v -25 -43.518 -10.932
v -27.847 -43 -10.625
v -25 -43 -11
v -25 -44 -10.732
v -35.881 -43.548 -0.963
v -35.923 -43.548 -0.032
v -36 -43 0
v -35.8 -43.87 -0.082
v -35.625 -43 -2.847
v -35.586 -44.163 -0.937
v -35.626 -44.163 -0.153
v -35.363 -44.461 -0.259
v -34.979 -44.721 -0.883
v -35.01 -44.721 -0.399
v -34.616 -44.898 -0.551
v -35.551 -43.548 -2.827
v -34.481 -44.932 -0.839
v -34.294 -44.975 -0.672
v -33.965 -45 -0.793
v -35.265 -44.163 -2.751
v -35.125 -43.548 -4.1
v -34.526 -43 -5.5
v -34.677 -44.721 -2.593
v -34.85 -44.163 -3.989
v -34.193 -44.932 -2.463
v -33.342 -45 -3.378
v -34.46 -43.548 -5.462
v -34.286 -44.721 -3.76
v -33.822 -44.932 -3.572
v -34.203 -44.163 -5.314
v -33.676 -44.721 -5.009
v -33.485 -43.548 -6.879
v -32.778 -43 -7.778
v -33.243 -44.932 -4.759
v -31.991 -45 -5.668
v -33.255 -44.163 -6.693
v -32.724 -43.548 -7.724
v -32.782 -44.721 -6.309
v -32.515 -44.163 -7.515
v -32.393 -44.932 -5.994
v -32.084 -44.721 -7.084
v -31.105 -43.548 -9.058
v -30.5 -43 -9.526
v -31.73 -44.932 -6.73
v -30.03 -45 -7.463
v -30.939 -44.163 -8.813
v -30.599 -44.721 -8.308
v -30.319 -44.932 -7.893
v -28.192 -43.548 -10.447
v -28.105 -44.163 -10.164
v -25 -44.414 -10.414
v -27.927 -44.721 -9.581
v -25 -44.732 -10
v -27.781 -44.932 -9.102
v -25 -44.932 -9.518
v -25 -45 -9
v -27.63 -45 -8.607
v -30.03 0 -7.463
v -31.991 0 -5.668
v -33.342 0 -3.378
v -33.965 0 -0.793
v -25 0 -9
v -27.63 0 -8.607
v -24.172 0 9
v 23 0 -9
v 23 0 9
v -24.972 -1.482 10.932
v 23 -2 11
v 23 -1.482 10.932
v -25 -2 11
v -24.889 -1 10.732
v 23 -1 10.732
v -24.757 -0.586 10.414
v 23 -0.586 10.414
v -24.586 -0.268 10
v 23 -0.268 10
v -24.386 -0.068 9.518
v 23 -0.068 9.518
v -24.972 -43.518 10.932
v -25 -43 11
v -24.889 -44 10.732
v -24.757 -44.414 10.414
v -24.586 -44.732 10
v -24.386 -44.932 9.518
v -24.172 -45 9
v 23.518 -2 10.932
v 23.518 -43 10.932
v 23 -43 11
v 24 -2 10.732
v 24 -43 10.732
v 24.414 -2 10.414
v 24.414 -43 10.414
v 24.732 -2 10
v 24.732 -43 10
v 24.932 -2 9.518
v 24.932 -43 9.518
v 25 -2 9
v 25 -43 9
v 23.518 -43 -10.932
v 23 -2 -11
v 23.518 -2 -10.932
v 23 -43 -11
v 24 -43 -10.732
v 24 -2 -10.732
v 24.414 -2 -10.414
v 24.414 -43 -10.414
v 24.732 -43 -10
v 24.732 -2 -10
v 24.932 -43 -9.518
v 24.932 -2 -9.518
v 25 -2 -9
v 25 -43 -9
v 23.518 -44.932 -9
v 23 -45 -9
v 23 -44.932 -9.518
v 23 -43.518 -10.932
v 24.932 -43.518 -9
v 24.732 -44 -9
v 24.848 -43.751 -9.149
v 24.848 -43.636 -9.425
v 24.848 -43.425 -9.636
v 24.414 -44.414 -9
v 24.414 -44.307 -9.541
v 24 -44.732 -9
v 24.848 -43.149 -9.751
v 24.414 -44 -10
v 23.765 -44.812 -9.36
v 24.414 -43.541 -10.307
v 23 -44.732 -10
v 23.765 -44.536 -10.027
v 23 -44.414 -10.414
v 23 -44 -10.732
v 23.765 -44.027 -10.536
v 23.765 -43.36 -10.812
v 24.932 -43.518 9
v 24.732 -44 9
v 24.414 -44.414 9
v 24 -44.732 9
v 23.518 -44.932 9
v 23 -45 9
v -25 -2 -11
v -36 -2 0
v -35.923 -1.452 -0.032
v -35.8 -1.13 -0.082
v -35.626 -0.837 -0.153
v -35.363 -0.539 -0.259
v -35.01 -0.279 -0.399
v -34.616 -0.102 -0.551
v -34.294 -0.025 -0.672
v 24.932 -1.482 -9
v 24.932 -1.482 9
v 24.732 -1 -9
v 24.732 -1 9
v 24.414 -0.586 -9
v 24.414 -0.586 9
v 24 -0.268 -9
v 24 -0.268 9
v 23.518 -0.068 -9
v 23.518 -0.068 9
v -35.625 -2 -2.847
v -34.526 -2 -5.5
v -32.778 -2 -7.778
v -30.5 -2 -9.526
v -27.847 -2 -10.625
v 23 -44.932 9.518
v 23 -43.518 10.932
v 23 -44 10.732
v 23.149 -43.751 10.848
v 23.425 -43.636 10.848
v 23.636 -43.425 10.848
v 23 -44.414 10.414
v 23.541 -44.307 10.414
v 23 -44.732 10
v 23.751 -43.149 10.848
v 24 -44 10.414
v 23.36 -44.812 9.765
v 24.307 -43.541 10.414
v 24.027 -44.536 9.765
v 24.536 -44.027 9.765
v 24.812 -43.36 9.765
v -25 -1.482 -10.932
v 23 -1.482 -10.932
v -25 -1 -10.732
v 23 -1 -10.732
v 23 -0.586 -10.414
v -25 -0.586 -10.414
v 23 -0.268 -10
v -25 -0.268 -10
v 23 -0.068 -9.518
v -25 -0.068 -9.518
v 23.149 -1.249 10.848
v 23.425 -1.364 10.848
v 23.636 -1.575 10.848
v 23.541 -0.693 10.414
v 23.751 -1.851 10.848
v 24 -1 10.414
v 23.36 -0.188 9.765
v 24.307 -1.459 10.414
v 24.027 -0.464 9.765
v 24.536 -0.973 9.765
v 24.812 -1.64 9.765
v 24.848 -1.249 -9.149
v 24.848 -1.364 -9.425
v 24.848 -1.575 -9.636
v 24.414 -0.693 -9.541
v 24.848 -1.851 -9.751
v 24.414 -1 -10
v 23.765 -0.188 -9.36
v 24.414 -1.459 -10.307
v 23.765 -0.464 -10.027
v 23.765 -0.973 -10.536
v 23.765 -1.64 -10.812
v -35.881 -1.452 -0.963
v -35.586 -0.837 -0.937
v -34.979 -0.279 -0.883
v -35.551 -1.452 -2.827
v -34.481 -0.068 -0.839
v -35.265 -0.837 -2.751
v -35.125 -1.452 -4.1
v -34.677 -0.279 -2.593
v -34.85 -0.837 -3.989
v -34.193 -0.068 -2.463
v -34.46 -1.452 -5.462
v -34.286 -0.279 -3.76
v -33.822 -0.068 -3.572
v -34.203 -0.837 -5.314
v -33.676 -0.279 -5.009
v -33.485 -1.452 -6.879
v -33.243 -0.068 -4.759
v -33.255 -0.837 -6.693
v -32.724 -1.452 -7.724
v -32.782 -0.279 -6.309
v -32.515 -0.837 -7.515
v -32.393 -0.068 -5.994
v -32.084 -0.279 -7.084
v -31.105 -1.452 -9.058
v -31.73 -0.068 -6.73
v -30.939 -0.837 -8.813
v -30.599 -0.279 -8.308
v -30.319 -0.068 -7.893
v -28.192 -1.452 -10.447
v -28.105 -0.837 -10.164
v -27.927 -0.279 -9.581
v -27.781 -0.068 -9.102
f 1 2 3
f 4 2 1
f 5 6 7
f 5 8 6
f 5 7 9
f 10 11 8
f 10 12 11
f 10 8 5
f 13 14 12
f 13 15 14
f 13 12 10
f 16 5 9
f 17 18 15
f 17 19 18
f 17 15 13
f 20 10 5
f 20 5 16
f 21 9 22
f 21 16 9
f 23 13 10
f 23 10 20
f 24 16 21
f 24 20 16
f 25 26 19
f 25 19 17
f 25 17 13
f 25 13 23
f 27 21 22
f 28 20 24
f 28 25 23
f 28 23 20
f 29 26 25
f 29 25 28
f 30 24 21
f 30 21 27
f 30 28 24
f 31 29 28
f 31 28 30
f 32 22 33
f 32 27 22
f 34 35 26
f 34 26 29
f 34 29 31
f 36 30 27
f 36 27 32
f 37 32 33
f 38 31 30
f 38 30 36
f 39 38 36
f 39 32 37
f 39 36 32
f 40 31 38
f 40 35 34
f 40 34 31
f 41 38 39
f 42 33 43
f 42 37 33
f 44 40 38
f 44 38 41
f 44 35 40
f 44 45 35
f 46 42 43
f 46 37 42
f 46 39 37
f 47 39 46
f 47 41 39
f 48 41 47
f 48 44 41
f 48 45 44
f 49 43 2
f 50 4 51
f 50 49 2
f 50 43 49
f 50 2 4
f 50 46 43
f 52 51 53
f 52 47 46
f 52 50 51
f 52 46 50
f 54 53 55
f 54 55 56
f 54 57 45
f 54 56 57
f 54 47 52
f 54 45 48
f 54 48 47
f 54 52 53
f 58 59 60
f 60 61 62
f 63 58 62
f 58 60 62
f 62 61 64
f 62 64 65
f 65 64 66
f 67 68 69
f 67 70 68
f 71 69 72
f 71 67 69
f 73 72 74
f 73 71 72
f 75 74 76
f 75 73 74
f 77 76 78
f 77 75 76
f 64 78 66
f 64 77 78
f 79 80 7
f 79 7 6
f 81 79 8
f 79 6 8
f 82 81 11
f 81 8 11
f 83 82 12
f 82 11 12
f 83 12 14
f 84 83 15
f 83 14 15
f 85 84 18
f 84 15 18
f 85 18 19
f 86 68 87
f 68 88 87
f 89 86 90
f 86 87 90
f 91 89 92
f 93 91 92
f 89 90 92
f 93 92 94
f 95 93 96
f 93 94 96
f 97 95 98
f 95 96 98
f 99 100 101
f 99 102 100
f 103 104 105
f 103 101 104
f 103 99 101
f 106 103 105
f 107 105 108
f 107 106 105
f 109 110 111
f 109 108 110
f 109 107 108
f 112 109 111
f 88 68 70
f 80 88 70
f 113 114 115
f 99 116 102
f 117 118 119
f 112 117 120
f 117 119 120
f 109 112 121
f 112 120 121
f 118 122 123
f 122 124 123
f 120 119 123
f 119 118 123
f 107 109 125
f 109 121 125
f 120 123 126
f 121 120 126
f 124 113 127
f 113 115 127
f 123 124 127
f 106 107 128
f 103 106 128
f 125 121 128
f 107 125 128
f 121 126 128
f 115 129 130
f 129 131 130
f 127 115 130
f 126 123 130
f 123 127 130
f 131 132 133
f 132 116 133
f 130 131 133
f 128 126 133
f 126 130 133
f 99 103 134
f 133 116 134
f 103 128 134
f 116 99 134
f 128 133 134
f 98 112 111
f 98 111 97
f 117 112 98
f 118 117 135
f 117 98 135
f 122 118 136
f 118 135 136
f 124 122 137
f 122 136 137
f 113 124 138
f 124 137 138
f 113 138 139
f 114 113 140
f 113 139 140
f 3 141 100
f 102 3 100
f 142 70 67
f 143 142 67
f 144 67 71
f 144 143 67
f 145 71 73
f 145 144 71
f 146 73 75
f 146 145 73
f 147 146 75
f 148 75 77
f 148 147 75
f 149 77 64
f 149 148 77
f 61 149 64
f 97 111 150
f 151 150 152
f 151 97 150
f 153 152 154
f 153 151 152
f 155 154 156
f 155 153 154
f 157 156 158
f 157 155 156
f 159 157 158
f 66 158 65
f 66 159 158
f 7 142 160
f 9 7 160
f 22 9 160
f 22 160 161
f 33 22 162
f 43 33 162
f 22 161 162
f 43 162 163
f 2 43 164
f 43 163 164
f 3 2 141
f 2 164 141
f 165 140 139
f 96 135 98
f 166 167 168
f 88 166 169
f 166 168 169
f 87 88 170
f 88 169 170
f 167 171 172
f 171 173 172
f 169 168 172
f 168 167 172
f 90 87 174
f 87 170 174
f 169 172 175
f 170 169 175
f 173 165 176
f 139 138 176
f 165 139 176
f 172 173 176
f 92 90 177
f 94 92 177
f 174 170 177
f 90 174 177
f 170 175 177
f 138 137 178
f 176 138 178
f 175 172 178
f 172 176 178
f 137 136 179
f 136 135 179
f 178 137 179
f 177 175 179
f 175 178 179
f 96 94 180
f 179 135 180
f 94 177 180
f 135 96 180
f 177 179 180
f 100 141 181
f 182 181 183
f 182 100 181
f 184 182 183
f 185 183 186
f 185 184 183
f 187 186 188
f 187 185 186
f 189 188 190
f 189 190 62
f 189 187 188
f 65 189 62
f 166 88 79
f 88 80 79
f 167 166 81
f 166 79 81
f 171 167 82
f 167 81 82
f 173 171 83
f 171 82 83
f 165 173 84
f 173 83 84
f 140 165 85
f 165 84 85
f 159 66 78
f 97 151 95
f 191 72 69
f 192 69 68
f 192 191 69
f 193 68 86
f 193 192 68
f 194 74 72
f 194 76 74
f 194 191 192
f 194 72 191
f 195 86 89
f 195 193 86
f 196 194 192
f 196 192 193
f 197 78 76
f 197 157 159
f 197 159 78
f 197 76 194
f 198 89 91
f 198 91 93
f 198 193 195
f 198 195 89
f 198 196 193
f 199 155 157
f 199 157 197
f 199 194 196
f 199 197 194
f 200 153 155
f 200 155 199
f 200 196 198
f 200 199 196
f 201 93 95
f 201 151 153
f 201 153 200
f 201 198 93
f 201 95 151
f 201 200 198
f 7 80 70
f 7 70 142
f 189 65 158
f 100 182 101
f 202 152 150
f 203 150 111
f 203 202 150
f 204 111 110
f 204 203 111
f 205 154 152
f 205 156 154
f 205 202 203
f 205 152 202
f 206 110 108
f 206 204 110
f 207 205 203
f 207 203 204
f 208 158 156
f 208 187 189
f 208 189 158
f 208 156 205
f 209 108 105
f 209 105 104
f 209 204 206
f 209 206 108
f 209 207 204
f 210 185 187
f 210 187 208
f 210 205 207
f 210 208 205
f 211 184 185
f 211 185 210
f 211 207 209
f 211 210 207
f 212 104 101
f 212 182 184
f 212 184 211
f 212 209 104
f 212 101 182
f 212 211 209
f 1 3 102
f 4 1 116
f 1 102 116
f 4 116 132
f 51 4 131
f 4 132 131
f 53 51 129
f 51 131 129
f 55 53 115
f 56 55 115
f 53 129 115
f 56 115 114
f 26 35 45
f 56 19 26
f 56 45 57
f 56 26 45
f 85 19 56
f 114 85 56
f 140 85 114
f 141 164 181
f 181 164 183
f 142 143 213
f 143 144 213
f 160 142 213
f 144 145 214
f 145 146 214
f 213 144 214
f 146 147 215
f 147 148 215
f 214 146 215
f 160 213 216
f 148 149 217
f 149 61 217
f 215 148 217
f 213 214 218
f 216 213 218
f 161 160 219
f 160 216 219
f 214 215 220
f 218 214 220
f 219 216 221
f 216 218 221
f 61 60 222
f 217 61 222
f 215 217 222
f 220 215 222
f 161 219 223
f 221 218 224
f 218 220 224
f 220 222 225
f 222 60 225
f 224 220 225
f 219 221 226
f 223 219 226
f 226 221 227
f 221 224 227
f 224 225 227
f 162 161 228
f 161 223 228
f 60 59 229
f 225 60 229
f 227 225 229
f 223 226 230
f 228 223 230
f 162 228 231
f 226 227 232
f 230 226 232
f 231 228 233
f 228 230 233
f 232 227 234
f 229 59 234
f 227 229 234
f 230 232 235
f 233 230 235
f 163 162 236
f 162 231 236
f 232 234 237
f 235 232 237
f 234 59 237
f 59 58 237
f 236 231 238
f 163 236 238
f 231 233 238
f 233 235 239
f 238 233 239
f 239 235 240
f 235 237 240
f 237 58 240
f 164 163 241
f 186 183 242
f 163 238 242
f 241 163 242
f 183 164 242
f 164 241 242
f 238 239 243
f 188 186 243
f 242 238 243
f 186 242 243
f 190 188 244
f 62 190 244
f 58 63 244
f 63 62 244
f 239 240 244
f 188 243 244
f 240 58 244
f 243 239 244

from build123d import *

# Parameters (mm, degrees)
F1_DEPTH = 45
F2_R     = 2


with BuildPart() as f1:
    # F0 (on Front) → F1 (new body)
    with BuildSketch(Plane.XZ):
        with BuildLine():
            Line((25, 11), (-25, 11))
            ThreePointArc((-25, 11), (-17.221825, 7.778175), (-14, 0))
            ThreePointArc((-14, 0), (-17.221825, -7.778175), (-25, -11))
            Line((-25, -11), (25, -11))
            Line((25, -11), (25, 11))
        make_face()
        with BuildLine():
            Line((-25, -11), (-25, 11))
            Line((-25, 11), (-36, 0))
            ThreePointArc((-36, 0), (-32.778175, -7.778175), (-25, -11))
        make_face()
        with BuildLine():
            ThreePointArc((-14, 0), (-17.221825, 7.778175), (-25, 11))
            Line((-25, 11), (-25, -11))
            ThreePointArc((-25, -11), (-17.221825, -7.778175), (-14, 0))
        make_face()
    extrude(amount=F1_DEPTH)

    # F2
    f2_edges = [f1.edges().sort_by_distance(p)[0] for p in [
        (0, -45, -11),
        (25, -45, 0),
        (0, -45, 11),
        (-30.5, -45, 5.5),
        (-32.778175, -45, -7.778175),
        (0, 0, -11),
        (25, 0, 0),
        (0, 0, 11),
        (-30.5, 0, 5.5),
        (-32.778175, 0, -7.778175),
        (25, -22.5, -11),
        (25, -22.5, 11),
    ]]
    fillet(f2_edges, radius=F2_R)


solid = f1.part
